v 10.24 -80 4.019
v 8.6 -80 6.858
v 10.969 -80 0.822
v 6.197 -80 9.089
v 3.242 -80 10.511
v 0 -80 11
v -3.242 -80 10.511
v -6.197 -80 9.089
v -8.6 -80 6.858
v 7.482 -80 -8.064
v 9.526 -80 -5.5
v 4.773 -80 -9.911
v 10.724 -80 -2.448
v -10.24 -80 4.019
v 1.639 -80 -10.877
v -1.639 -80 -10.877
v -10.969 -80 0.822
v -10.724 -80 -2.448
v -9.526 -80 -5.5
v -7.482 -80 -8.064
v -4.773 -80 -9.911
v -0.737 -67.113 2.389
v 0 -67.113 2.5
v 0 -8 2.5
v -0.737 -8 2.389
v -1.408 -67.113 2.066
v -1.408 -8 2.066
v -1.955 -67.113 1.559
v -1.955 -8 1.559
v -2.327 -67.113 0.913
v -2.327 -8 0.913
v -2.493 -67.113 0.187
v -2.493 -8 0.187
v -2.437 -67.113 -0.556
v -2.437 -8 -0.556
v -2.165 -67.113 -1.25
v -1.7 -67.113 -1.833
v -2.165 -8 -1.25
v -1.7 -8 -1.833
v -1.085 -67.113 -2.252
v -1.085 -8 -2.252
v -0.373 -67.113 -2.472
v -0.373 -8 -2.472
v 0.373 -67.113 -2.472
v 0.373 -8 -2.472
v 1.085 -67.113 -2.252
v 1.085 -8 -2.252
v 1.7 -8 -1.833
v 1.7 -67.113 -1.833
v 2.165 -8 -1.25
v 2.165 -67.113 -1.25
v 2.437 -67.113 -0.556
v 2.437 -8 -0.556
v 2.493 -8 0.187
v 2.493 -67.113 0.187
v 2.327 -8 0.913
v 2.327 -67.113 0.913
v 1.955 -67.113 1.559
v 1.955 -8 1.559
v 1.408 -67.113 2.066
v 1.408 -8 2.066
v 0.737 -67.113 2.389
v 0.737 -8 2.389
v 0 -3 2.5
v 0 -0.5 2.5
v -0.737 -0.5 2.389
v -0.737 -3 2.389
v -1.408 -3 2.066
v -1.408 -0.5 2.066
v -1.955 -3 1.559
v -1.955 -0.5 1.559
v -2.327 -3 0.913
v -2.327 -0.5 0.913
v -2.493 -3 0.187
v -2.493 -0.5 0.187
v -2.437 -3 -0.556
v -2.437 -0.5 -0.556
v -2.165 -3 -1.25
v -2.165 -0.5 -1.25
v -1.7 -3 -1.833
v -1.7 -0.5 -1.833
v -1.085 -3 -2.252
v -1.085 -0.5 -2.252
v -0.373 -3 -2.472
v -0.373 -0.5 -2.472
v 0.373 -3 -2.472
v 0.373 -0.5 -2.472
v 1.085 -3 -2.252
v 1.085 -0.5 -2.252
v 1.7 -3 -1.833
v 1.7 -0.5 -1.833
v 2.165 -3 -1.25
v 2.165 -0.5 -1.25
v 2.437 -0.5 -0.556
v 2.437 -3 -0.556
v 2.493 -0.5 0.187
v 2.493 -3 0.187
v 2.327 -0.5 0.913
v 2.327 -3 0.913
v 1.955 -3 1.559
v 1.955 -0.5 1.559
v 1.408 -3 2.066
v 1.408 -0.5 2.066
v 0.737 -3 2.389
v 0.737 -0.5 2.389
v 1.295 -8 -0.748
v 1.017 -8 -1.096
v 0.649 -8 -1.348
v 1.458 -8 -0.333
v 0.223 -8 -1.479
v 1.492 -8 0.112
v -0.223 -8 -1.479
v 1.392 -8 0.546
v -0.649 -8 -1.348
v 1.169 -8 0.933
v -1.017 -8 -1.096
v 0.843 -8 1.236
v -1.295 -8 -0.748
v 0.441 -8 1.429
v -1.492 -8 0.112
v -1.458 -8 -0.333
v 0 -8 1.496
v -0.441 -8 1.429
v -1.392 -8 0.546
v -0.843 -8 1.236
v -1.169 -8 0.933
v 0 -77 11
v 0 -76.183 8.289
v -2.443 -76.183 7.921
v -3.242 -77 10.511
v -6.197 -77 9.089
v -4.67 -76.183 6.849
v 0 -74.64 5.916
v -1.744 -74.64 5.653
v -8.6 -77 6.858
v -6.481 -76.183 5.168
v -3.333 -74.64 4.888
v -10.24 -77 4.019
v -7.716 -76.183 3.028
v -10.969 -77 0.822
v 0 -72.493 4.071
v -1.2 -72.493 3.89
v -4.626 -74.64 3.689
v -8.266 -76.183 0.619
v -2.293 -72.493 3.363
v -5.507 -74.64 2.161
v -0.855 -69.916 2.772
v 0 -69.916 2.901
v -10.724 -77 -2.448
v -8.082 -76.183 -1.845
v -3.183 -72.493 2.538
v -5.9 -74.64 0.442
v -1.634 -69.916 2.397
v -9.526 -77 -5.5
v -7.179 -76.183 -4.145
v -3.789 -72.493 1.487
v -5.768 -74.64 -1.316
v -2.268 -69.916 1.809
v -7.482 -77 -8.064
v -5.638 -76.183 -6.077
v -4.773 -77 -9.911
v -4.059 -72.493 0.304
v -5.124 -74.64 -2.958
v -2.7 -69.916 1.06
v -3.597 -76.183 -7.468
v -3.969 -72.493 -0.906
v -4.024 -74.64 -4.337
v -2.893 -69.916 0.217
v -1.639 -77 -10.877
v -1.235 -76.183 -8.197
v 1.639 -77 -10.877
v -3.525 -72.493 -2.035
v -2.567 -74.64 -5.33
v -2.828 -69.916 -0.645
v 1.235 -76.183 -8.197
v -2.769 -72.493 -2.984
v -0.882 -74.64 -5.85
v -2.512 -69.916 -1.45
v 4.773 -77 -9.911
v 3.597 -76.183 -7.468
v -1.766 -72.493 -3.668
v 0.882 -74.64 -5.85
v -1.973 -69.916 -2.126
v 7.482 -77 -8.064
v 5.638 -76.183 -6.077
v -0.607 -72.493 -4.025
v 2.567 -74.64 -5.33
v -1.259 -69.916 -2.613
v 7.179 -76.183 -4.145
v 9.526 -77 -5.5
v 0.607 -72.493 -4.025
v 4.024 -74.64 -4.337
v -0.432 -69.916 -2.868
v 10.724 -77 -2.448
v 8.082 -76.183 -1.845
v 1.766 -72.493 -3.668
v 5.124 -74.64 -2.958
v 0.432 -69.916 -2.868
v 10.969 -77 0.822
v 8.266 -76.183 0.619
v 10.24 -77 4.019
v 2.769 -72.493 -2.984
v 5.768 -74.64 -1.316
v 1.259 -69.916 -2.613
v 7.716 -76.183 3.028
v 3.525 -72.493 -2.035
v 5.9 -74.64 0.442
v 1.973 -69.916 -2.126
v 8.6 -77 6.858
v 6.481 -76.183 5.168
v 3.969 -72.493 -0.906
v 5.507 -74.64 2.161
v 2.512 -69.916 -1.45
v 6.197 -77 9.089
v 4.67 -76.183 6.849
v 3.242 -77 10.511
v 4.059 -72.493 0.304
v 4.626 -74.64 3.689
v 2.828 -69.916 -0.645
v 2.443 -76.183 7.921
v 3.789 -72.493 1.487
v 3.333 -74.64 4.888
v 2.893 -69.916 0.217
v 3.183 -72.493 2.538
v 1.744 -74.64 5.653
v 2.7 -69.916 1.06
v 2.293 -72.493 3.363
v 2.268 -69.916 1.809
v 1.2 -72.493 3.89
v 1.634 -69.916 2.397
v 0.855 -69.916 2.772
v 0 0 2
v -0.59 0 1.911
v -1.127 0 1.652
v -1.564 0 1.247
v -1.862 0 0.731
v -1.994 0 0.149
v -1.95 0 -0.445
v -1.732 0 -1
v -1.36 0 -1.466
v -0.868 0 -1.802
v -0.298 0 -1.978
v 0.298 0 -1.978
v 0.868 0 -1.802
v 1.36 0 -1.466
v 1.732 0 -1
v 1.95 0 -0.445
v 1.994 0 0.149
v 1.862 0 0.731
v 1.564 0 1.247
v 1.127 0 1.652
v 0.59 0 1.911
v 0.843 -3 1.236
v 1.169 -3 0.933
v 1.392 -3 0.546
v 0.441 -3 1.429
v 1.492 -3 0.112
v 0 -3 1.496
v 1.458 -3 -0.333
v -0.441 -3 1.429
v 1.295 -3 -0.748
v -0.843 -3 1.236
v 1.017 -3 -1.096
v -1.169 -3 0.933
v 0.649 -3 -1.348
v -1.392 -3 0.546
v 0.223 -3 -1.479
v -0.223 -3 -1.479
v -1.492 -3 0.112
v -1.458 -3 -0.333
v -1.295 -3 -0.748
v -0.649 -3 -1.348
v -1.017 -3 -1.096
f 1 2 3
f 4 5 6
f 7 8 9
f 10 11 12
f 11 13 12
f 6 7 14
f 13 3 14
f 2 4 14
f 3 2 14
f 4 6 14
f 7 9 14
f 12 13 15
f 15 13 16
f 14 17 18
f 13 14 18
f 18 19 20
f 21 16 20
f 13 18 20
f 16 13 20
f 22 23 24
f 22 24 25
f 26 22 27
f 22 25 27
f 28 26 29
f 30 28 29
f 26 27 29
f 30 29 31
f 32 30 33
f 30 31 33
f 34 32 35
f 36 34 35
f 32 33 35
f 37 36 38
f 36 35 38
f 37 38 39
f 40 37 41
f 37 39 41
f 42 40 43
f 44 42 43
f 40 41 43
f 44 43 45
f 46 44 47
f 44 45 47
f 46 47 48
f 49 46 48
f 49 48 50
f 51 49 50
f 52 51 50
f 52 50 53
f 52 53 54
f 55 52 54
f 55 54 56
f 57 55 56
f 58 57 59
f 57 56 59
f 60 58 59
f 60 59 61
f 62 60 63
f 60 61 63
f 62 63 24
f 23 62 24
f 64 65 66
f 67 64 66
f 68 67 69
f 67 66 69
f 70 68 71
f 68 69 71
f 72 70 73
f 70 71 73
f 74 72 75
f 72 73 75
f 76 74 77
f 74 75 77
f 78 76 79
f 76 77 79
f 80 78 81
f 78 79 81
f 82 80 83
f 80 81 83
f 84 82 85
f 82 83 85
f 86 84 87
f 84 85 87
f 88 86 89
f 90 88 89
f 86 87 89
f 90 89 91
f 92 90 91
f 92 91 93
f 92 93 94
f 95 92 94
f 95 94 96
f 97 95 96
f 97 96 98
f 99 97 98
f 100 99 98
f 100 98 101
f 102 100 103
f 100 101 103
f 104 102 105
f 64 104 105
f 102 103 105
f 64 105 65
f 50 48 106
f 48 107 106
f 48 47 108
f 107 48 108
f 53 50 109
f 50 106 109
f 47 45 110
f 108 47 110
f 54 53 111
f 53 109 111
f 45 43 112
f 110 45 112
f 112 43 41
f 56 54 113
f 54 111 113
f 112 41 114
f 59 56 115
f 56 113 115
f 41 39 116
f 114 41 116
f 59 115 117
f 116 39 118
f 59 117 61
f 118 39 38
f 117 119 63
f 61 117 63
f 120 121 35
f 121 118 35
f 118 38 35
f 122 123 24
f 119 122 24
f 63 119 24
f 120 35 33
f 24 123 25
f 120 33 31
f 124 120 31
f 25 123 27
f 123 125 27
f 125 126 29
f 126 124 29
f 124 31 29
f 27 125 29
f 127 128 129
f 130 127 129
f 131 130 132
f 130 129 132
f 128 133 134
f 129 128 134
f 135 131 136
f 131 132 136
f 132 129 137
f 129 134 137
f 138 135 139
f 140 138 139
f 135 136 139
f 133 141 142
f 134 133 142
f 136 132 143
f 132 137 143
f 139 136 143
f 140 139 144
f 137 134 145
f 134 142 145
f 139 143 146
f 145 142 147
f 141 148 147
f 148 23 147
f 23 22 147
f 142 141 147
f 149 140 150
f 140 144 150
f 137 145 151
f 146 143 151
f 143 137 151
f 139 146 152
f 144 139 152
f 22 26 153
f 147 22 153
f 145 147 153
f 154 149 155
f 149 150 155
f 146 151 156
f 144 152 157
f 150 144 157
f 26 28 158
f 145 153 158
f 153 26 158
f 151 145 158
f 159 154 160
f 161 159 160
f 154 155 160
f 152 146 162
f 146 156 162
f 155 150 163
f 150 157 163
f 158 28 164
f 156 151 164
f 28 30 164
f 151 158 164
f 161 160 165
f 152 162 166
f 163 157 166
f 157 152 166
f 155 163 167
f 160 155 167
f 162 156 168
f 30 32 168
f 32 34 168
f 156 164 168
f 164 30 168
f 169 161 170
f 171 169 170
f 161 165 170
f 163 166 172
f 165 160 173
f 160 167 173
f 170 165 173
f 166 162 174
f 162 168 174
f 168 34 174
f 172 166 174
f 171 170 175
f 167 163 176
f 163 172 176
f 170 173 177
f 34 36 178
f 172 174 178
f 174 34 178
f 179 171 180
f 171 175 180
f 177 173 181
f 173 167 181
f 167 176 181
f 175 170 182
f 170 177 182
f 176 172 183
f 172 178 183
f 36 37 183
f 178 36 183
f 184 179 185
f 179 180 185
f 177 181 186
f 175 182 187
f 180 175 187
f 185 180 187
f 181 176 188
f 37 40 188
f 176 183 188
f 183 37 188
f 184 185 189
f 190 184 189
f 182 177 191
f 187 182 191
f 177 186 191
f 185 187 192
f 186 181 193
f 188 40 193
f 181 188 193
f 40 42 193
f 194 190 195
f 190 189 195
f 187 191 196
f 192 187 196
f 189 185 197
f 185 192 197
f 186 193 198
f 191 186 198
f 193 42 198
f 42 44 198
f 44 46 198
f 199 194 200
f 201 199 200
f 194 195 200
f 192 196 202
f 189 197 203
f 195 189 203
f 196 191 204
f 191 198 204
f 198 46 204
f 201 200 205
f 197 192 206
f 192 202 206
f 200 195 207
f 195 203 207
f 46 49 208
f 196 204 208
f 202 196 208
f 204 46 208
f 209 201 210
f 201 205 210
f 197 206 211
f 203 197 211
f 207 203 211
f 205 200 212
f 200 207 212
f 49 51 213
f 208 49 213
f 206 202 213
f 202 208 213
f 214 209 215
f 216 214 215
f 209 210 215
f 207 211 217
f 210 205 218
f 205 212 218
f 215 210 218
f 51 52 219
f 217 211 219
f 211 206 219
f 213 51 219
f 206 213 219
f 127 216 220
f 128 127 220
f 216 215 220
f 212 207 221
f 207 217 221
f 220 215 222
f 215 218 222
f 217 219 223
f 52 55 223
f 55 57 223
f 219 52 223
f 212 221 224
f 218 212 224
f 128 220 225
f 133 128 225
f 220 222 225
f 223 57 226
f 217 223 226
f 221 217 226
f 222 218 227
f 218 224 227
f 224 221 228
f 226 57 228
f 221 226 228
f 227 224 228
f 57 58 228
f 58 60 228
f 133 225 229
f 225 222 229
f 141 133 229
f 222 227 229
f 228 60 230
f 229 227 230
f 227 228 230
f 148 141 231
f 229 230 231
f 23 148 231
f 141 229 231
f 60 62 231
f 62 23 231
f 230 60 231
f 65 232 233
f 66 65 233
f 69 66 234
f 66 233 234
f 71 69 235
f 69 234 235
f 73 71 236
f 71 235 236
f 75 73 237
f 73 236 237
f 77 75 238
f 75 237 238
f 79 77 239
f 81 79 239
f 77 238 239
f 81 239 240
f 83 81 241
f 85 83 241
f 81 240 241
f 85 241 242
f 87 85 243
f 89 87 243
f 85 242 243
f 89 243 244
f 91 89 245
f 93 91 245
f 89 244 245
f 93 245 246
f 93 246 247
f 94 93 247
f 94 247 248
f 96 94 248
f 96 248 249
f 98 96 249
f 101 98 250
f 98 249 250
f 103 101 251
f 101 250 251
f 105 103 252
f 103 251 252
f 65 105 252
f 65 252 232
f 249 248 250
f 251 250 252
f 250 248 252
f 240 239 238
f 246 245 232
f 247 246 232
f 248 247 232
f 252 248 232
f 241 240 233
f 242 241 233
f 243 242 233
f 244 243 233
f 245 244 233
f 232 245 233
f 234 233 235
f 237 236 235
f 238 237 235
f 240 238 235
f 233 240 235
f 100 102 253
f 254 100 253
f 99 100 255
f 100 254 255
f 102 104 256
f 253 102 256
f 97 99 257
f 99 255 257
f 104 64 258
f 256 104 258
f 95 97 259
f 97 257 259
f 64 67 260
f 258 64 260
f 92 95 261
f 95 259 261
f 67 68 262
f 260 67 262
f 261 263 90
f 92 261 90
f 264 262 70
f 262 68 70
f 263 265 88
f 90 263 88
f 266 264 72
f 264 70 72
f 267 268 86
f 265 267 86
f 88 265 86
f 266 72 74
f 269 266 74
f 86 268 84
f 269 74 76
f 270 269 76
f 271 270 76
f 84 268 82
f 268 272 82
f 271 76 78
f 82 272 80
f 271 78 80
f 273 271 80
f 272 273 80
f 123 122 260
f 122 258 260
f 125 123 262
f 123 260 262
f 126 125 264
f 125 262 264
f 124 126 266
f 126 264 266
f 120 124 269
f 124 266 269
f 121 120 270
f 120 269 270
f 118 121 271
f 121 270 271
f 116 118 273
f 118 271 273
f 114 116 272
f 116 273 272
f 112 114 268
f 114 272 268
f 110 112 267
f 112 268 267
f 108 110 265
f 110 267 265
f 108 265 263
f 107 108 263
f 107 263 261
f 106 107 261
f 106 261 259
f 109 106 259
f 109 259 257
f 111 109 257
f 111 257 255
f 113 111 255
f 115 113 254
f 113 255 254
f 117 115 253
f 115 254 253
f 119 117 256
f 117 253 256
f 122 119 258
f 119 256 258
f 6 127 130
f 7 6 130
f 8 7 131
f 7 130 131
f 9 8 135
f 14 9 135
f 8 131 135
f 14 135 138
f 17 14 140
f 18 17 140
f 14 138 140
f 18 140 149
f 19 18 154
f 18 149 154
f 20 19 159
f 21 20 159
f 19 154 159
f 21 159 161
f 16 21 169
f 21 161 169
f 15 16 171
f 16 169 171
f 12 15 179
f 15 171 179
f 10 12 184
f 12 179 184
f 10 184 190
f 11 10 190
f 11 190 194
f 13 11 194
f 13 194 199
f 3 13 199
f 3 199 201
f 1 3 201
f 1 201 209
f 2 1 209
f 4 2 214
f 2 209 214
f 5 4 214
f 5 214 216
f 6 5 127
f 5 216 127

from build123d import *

# Parameters (mm, degrees)
CHAMFER1_SIZE = 0.5
FILLET1_R     = 10


with BuildPart() as part:
    # Sketch1 → Revolve1 (revolve)
    with BuildSketch(Plane(origin=(0, 0, 0), x_dir=(0, 0, -1), z_dir=(1, 0, 0)), mode=Mode.PRIVATE) as revolve1_sk:
        Polygon((0, 0), (0, -80), (11.00000000000001, -80), (11.00000000000001, -77), (2.5000000000000098, -77), (2.5000000000000098, -8), (1.4957064412197685, -8), (1.4957064412197685, -3.000000000000001), (2.500000000000019, -3.000000000000001), (2.500000000000019, -4e-16), align=None)
    revolve(revolve1_sk.sketch.rotate(Axis((0, 0, 0), (0, -1, 0)), 180), axis=Axis((0, 0, 0), (0, -1, 0)))

    # Chamfer1
    chamfer1_edges = [part.edges().sort_by_distance(p)[0] for p in [
        (-6.1e-16, -4e-16, -2.500000000000019),
    ]]
    chamfer(chamfer1_edges, length=CHAMFER1_SIZE)

    # Fillet1
    # the kernel refuses this fillet: 10 mm, written as the material it adds along each edge
    with BuildSketch(Plane(origin=(0, -77, 0), x_dir=(1.2e-16, 0, 1), z_dir=(1, 0, -1.2e-16))) as fillet1_piece_1:
        with BuildLine():
            CenterArc((12.500000000000007, -9.886859966642888), FILLET1_R, 98.62692655867836, 81.37307344132165)
            Line((11.000000000000053, -2.8422e-13), (10.970000000000054, 0.19773719933256473))
            ThreePointArc((10.970000000000054, 0.19773719933256473), (6.750000000000032, 0.20000000000000284), (2.5000000000000098, 0.20000000000000284))
            Line((2.5000000000000098, 0.20000000000000284), (2.3000000000000096, 0))
            Line((2.3000000000000096, 0), (2.300000000000007, -9.886859966642888))
            Line((2.300000000000007, -9.886859966642888), (2.500000000000007, -9.886859966642888))
        make_face()
    revolve(axis=Axis((0, -77, 0), (0, -1, 0)))


solid = part.part
